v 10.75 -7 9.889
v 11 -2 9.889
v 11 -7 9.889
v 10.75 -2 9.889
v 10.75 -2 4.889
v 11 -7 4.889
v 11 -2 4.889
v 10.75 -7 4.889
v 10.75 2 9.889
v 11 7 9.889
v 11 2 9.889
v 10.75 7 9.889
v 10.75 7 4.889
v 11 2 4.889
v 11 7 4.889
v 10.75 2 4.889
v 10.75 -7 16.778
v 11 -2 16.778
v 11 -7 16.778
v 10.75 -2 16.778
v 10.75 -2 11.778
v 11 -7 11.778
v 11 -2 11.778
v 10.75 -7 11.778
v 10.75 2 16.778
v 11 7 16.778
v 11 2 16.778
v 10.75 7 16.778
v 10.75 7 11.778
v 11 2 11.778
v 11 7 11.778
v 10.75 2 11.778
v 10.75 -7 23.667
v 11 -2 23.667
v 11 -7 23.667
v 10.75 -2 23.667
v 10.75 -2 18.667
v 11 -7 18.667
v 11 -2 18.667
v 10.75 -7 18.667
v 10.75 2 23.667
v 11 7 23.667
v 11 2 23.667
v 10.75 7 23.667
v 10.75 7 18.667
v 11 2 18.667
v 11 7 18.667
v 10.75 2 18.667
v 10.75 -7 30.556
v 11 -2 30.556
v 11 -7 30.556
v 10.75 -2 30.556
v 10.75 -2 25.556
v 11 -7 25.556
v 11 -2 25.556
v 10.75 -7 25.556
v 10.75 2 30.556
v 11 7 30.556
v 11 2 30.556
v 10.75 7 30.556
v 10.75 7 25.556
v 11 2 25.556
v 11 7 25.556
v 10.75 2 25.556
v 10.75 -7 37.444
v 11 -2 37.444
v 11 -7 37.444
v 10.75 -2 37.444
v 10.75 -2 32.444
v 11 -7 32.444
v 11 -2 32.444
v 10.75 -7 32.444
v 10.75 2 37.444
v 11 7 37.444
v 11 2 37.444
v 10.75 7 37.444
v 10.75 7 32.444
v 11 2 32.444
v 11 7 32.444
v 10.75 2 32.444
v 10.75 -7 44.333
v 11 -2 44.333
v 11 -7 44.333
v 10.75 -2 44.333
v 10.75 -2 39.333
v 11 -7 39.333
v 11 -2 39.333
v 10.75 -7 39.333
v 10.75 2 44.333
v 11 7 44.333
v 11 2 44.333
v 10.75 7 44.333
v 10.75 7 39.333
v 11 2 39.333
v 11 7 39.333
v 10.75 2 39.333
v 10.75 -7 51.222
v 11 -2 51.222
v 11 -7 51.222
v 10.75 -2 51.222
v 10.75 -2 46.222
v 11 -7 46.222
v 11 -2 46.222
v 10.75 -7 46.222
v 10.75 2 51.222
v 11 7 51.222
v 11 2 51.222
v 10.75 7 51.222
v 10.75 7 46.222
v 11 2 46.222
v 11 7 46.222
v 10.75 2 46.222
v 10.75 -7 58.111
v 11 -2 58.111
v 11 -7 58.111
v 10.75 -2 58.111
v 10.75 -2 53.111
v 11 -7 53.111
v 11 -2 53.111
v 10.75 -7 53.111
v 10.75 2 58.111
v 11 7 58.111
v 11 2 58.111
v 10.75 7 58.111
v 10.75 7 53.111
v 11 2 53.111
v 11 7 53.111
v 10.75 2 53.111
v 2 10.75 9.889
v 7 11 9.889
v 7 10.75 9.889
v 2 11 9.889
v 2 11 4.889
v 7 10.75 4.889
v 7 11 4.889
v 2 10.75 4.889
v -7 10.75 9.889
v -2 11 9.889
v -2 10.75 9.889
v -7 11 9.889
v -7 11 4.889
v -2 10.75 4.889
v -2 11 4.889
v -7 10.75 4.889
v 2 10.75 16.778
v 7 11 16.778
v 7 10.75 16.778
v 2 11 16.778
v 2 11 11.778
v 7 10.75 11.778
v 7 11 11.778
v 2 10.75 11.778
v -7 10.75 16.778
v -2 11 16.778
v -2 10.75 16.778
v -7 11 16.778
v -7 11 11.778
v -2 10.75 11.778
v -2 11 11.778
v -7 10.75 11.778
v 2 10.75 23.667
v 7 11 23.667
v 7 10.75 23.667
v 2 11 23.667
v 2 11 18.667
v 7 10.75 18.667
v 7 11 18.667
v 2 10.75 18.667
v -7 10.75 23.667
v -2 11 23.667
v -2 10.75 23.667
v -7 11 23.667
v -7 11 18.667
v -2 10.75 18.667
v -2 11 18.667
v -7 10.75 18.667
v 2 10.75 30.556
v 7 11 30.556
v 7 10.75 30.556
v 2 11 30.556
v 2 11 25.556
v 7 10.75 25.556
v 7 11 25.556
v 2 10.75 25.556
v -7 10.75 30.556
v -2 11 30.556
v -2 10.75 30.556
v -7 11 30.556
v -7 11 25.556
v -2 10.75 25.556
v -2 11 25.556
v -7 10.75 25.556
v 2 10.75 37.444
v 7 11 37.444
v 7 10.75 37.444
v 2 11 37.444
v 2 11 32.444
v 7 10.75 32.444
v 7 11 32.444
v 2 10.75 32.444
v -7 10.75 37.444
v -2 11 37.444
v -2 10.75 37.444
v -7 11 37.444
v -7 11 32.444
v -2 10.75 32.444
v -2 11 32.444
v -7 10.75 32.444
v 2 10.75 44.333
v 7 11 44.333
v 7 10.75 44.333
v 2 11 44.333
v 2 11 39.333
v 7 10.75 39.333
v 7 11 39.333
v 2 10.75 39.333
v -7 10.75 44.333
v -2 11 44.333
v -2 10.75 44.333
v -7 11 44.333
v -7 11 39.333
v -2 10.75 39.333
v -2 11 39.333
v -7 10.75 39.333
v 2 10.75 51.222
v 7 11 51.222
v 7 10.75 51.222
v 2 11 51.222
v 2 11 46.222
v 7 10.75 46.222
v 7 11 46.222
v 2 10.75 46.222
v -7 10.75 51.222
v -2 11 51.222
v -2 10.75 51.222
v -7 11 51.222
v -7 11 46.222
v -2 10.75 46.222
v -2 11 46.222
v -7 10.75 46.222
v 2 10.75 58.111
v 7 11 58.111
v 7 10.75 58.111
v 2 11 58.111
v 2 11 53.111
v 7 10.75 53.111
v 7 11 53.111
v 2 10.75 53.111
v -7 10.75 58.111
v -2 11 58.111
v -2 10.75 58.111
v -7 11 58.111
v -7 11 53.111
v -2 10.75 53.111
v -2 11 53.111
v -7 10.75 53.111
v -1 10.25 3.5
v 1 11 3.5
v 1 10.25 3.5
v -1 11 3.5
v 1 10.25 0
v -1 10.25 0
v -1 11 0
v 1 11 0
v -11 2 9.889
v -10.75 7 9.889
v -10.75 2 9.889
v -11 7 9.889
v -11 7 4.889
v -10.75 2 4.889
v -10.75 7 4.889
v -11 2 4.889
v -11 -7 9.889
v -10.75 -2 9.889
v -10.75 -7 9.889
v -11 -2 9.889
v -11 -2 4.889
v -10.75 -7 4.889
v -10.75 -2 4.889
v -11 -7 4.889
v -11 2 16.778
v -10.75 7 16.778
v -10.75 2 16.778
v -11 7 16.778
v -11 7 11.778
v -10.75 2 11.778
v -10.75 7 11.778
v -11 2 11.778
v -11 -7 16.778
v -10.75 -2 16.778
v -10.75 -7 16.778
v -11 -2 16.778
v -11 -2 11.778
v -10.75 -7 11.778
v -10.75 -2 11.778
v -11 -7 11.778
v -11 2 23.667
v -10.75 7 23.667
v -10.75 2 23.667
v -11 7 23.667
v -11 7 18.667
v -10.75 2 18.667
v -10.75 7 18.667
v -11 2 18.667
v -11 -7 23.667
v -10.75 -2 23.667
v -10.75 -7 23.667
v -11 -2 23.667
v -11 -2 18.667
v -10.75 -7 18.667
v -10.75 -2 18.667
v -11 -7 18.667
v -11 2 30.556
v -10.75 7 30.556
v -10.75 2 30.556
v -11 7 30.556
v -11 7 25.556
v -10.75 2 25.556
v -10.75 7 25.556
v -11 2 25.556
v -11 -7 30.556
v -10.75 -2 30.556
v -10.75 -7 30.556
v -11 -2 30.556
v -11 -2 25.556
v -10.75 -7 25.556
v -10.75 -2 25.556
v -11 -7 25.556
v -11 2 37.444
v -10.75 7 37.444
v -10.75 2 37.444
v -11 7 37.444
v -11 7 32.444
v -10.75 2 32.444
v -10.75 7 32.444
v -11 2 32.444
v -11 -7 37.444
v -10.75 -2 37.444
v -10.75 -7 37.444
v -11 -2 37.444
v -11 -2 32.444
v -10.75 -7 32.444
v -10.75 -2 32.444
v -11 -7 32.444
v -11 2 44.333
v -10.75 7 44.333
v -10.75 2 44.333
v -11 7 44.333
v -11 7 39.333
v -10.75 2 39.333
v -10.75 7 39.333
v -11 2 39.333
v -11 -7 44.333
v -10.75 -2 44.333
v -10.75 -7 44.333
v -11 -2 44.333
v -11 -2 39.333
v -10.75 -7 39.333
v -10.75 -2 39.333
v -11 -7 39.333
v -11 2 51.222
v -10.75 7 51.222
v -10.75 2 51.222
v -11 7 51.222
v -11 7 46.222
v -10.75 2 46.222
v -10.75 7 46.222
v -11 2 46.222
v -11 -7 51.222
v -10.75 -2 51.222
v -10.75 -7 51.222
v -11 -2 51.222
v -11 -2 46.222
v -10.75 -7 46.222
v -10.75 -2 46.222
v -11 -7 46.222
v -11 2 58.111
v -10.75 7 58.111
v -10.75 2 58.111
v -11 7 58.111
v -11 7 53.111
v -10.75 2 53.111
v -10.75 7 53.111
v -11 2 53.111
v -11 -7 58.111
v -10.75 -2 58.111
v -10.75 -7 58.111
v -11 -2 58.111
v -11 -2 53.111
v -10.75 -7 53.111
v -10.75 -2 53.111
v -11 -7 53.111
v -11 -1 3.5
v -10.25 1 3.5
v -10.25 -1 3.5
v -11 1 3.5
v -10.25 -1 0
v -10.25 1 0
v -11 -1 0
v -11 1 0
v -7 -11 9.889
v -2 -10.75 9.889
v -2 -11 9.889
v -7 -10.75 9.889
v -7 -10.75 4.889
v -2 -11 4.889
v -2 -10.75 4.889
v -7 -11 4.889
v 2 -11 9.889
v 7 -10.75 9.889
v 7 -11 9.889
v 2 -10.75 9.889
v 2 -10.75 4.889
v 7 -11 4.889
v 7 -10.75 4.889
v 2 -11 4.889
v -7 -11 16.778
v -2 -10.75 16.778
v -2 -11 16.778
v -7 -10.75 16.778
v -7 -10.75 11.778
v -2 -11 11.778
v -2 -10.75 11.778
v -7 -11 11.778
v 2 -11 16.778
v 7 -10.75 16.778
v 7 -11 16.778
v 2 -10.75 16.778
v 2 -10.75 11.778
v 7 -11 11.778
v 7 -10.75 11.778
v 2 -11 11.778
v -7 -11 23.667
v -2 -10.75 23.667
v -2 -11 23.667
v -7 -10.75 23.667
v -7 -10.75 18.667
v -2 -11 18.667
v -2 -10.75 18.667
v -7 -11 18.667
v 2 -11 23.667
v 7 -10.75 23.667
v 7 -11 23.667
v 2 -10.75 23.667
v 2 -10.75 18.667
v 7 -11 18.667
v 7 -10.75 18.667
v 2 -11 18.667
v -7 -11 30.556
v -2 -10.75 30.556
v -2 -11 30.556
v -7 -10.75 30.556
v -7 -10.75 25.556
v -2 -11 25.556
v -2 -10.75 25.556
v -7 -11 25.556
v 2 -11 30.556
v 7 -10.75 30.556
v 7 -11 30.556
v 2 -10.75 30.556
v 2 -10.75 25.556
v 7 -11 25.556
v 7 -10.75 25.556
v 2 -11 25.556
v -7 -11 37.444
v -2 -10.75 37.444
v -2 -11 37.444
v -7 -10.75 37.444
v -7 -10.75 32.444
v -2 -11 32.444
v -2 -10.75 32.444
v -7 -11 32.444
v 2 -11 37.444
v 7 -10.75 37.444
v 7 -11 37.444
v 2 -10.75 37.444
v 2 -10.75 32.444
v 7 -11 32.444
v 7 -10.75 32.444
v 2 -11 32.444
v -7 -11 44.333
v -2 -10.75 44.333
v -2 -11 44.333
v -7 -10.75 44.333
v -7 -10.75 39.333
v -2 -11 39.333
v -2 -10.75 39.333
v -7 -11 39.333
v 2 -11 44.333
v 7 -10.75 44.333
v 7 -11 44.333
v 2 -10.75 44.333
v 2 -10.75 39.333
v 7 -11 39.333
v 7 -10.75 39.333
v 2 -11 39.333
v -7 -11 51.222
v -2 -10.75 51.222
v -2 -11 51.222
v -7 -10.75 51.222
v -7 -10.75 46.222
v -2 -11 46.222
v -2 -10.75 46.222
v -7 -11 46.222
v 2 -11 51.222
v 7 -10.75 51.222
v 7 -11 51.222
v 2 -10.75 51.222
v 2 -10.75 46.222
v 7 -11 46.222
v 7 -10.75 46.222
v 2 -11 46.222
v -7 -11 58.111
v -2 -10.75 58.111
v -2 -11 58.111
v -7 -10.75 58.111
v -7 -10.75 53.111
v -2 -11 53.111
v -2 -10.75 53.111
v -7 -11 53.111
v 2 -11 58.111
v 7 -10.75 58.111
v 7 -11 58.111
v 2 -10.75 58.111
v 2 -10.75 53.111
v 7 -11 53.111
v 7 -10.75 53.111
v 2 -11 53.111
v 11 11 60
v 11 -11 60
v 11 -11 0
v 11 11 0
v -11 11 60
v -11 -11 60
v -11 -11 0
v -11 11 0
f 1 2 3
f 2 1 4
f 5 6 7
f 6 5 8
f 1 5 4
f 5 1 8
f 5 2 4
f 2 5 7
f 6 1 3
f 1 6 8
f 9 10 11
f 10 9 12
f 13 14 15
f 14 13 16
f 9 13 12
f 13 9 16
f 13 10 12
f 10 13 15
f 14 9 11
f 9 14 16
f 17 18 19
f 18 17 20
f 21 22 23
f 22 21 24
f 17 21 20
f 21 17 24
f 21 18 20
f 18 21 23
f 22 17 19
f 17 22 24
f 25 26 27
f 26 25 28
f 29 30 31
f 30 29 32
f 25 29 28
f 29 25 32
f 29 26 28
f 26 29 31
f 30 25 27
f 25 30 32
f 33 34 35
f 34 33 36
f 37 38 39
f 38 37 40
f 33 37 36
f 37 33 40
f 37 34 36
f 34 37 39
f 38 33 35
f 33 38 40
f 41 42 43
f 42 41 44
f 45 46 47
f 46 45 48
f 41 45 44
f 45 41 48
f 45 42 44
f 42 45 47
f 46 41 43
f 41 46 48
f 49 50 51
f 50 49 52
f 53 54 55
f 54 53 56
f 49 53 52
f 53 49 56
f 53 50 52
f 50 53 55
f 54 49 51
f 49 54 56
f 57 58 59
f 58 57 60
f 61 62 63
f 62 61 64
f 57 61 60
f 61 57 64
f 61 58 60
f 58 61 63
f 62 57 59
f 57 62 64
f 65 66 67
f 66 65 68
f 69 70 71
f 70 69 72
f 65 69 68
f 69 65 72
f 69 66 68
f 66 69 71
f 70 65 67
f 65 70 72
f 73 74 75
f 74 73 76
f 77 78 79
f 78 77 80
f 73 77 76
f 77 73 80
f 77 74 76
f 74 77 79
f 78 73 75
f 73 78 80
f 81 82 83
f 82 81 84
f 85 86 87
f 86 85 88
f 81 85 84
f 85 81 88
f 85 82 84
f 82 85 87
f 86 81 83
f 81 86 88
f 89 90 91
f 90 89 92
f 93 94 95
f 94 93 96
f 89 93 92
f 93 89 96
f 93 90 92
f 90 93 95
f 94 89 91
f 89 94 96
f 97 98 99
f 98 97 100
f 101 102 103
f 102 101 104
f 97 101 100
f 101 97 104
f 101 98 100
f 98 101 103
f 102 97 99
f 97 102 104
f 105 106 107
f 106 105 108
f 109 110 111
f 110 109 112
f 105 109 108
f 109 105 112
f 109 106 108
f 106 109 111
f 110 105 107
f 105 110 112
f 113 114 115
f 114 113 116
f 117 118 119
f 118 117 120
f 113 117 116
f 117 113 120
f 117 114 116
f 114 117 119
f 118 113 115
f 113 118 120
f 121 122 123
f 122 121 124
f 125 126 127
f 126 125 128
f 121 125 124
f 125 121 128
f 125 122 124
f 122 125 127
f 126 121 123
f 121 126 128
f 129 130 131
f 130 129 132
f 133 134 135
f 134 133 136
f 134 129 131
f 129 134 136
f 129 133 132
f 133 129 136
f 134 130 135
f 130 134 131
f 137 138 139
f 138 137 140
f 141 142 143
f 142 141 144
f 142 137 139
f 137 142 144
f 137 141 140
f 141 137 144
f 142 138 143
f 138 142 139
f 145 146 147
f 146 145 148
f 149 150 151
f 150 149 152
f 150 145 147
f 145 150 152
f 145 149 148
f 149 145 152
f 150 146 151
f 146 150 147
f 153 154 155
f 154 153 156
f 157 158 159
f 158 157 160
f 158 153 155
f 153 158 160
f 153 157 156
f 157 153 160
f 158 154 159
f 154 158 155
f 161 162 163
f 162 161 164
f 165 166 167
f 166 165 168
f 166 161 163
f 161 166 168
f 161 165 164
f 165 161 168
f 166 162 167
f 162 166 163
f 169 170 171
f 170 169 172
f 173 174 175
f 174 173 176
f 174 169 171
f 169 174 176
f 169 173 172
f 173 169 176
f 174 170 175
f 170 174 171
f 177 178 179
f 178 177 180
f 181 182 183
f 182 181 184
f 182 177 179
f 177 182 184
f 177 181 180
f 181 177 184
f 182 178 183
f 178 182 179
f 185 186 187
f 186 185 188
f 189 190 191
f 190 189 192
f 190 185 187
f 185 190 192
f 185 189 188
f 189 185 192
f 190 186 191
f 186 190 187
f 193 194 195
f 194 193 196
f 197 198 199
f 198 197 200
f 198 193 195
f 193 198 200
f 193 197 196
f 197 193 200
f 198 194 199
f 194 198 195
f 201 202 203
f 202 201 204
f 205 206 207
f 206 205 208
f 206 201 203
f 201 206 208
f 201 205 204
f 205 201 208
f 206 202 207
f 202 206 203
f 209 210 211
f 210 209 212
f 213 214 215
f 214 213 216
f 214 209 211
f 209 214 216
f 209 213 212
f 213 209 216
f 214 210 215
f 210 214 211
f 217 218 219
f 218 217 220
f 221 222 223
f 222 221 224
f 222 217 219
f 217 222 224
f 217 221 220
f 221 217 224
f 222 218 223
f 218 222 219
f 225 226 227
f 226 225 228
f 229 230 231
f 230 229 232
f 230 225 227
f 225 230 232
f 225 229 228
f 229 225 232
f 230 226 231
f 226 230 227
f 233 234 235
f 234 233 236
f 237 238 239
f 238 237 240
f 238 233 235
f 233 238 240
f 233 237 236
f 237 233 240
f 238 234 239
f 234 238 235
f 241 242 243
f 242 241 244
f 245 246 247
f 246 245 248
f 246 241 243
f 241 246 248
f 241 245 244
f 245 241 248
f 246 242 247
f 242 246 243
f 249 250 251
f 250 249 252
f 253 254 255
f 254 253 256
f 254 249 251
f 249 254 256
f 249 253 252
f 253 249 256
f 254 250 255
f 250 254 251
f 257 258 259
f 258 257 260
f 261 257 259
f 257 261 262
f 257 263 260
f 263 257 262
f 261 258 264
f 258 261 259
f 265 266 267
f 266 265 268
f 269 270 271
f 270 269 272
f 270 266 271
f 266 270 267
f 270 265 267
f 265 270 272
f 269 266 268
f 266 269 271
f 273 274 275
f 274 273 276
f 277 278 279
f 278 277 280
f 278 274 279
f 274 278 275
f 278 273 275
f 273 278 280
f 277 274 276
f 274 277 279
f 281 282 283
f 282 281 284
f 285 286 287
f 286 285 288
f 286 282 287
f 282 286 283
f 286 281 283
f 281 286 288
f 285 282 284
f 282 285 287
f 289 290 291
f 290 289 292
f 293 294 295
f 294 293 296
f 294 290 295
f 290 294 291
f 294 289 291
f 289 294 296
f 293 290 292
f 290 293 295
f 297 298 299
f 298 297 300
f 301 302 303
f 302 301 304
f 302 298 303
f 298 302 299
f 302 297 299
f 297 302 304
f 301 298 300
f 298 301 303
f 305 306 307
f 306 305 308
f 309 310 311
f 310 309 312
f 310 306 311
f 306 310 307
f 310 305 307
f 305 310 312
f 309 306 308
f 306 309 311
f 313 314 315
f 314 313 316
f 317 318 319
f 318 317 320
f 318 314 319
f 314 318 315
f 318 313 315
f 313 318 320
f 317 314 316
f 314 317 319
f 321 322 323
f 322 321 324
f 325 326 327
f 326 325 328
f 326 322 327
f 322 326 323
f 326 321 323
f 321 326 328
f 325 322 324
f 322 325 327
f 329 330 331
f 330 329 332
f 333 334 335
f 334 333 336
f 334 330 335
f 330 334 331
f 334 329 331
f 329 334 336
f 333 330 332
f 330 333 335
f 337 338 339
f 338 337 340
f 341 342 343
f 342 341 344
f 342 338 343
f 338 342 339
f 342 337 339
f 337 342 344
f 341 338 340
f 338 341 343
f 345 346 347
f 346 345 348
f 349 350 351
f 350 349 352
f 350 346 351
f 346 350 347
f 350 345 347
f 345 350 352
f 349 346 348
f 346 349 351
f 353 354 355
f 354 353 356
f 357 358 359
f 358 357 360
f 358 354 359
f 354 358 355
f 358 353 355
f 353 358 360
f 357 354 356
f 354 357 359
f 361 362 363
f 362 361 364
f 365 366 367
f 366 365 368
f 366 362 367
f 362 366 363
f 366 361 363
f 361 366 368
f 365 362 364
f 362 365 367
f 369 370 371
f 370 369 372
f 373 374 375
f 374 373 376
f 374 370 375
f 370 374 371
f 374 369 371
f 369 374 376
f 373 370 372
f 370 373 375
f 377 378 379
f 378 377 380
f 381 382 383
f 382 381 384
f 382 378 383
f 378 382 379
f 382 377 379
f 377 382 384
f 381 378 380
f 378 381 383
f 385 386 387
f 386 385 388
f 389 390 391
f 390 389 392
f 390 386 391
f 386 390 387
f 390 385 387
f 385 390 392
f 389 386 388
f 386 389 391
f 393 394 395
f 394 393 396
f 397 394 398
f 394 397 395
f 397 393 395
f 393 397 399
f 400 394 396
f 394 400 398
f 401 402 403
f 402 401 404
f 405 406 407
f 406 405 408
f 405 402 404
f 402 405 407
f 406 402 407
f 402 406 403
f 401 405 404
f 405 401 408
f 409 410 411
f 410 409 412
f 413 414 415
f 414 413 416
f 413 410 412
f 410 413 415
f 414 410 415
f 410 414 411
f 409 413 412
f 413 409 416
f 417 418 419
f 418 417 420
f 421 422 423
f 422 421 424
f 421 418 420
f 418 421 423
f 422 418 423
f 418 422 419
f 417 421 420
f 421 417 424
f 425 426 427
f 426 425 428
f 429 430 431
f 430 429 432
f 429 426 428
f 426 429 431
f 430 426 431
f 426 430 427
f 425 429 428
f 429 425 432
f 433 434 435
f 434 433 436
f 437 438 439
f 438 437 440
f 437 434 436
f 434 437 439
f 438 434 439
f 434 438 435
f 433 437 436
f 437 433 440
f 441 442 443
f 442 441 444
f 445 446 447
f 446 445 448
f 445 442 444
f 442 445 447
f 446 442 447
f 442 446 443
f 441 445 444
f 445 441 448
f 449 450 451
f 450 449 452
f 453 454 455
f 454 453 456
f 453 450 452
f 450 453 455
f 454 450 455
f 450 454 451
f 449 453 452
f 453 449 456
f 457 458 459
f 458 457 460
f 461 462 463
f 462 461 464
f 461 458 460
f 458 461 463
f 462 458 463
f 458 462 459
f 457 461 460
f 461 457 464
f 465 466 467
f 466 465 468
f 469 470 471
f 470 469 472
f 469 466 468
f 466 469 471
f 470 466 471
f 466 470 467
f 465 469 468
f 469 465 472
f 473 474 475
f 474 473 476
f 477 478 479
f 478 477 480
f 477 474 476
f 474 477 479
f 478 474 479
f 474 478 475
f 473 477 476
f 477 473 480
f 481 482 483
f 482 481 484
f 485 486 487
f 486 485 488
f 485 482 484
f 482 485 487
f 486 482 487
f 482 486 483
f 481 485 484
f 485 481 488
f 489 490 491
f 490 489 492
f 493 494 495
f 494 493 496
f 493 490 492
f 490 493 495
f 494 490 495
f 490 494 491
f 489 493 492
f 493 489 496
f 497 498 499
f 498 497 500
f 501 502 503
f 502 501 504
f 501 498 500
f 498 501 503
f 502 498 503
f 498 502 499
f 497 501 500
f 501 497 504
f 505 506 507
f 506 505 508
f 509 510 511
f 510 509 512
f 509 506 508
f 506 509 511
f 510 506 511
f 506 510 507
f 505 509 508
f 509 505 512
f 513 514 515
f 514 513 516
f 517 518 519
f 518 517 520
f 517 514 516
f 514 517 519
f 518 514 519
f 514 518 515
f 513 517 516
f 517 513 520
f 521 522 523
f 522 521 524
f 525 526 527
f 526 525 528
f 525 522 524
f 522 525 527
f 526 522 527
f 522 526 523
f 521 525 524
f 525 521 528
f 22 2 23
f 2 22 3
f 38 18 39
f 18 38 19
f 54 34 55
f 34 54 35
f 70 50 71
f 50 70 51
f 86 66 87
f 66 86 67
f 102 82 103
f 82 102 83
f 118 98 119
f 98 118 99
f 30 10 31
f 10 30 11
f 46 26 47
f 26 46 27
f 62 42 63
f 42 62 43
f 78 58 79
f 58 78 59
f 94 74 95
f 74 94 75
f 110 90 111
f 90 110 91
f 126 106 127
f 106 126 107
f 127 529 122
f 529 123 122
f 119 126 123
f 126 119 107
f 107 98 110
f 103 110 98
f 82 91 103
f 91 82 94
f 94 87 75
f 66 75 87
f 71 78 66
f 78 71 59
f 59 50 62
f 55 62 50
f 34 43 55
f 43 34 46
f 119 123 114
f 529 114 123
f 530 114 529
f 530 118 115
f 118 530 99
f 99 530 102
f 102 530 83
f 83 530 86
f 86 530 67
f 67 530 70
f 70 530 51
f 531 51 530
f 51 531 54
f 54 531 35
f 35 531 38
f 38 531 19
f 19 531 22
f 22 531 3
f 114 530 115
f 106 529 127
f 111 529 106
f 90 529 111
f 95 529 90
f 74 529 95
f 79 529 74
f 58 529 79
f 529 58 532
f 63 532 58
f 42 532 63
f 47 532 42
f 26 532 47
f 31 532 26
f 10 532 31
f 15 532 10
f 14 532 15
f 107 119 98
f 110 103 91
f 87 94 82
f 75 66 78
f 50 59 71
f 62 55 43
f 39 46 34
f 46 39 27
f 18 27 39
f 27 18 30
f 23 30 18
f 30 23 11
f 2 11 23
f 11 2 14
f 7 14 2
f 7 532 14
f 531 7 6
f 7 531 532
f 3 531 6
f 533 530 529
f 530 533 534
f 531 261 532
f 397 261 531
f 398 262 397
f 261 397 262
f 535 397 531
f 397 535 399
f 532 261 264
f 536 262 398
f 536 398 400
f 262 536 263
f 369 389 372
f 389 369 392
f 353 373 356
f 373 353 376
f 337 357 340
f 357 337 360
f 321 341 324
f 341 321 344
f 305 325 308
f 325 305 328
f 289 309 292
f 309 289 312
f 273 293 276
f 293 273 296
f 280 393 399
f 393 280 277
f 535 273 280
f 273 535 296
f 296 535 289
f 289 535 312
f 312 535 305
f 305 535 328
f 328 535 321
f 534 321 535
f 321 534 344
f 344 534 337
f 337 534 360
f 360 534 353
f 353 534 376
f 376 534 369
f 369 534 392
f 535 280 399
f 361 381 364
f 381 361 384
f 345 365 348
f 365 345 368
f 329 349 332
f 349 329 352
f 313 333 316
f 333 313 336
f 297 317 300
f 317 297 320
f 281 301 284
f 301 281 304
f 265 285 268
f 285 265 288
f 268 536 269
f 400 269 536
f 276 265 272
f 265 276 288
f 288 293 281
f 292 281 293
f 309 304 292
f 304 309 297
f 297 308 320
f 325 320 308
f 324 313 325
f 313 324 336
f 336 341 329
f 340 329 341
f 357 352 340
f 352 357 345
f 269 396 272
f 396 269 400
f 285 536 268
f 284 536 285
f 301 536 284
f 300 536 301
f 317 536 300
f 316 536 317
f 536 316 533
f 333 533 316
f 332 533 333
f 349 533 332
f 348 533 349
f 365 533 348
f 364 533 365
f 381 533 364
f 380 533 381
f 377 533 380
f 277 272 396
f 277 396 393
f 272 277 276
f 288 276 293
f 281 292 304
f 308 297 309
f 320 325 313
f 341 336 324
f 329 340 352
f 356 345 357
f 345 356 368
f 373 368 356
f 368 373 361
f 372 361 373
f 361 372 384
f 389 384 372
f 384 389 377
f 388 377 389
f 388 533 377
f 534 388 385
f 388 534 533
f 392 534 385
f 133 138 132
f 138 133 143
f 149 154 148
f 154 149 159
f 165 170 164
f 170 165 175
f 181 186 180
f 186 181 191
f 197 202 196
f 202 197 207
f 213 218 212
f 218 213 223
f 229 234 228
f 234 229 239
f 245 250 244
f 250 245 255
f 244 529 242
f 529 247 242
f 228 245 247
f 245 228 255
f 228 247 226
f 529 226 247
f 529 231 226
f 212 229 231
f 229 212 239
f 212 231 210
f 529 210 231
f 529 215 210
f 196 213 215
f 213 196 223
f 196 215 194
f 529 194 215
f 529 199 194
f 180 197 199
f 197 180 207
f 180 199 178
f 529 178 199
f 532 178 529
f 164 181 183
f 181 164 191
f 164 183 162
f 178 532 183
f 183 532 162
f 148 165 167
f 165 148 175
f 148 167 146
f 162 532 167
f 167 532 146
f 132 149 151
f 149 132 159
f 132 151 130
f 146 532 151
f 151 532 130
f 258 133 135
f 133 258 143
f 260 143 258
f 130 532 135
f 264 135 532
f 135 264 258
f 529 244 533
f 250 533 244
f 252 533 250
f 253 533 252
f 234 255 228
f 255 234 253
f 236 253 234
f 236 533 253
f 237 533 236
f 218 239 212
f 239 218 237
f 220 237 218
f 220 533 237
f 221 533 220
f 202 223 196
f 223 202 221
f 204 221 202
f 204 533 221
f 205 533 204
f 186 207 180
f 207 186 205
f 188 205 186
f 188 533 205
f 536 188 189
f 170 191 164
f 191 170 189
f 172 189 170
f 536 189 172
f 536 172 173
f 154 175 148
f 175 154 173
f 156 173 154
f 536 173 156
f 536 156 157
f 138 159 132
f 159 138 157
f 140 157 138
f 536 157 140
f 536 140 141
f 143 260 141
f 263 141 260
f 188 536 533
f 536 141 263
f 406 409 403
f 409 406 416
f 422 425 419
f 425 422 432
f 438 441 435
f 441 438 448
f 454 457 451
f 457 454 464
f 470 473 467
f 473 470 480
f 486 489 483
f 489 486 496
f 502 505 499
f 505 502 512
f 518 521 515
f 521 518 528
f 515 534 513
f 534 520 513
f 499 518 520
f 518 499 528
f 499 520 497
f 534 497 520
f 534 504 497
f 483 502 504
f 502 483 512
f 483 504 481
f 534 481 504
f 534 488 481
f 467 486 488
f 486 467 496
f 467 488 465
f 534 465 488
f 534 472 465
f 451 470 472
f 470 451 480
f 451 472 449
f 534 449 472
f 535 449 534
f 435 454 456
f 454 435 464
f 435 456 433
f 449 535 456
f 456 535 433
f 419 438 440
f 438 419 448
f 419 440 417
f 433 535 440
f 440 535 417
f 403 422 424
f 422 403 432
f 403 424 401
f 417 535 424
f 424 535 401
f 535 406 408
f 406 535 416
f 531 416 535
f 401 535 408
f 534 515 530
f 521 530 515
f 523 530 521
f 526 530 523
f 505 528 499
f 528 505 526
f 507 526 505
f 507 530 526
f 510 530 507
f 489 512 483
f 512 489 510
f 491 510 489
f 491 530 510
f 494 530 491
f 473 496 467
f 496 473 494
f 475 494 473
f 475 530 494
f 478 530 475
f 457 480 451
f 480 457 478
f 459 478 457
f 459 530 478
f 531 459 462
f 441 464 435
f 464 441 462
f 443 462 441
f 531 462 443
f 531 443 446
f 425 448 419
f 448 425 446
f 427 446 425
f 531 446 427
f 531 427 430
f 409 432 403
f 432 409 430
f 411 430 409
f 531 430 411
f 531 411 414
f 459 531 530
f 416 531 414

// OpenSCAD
//Building Settings
width = 22;
depth = 22;
height = 60;
stories = 8;

//Window Settings
windowheight = 5;
windowwidth = 5;
windowdepth = 0.5;
numberofwindows = 2;

//Door Settings
dooronsides = [1,2];
doorwidth = 1.5;
doordepth = 1;
doorheight = 3;

difference(){
translate([0,0,height/2]) cube([width,depth,height],center=true);

for(r=[0:90:359]){
  rotate([0,0,r]){
    for(door=dooronsides){
      if(r/90 == door){
        translate([width/2,0,doorheight/2])
          cube([doorwidth,doordepth+1,doorheight+1],center=true);
        }
      }
    for(s=[0:1:stories - 1])
      for(n=[0:1:numberofwindows -1]){
        translate([width/2,CalculateEvenSpacing(totalWidth = width, itemWidth = windowwidth, itemCount = numberofwindows, itemIndex = n), CalculateEvenSpacing(totalWidth = height - doorheight, itemWidth = windowheight, itemCount = stories, itemIndex = s) + doorheight/2 + height/2])
        cube([windowdepth,windowwidth,windowheight],center=true);
        
      }
    }
  }
}

function CalculateEvenSpacing(totalWidth, itemWidth, itemCount, itemIndex) =
        (totalWidth-itemWidth*itemCount)/(itemCount+1) * (itemIndex + 1) + (itemIndex + 1/2) * itemWidth - totalWidth/2;
